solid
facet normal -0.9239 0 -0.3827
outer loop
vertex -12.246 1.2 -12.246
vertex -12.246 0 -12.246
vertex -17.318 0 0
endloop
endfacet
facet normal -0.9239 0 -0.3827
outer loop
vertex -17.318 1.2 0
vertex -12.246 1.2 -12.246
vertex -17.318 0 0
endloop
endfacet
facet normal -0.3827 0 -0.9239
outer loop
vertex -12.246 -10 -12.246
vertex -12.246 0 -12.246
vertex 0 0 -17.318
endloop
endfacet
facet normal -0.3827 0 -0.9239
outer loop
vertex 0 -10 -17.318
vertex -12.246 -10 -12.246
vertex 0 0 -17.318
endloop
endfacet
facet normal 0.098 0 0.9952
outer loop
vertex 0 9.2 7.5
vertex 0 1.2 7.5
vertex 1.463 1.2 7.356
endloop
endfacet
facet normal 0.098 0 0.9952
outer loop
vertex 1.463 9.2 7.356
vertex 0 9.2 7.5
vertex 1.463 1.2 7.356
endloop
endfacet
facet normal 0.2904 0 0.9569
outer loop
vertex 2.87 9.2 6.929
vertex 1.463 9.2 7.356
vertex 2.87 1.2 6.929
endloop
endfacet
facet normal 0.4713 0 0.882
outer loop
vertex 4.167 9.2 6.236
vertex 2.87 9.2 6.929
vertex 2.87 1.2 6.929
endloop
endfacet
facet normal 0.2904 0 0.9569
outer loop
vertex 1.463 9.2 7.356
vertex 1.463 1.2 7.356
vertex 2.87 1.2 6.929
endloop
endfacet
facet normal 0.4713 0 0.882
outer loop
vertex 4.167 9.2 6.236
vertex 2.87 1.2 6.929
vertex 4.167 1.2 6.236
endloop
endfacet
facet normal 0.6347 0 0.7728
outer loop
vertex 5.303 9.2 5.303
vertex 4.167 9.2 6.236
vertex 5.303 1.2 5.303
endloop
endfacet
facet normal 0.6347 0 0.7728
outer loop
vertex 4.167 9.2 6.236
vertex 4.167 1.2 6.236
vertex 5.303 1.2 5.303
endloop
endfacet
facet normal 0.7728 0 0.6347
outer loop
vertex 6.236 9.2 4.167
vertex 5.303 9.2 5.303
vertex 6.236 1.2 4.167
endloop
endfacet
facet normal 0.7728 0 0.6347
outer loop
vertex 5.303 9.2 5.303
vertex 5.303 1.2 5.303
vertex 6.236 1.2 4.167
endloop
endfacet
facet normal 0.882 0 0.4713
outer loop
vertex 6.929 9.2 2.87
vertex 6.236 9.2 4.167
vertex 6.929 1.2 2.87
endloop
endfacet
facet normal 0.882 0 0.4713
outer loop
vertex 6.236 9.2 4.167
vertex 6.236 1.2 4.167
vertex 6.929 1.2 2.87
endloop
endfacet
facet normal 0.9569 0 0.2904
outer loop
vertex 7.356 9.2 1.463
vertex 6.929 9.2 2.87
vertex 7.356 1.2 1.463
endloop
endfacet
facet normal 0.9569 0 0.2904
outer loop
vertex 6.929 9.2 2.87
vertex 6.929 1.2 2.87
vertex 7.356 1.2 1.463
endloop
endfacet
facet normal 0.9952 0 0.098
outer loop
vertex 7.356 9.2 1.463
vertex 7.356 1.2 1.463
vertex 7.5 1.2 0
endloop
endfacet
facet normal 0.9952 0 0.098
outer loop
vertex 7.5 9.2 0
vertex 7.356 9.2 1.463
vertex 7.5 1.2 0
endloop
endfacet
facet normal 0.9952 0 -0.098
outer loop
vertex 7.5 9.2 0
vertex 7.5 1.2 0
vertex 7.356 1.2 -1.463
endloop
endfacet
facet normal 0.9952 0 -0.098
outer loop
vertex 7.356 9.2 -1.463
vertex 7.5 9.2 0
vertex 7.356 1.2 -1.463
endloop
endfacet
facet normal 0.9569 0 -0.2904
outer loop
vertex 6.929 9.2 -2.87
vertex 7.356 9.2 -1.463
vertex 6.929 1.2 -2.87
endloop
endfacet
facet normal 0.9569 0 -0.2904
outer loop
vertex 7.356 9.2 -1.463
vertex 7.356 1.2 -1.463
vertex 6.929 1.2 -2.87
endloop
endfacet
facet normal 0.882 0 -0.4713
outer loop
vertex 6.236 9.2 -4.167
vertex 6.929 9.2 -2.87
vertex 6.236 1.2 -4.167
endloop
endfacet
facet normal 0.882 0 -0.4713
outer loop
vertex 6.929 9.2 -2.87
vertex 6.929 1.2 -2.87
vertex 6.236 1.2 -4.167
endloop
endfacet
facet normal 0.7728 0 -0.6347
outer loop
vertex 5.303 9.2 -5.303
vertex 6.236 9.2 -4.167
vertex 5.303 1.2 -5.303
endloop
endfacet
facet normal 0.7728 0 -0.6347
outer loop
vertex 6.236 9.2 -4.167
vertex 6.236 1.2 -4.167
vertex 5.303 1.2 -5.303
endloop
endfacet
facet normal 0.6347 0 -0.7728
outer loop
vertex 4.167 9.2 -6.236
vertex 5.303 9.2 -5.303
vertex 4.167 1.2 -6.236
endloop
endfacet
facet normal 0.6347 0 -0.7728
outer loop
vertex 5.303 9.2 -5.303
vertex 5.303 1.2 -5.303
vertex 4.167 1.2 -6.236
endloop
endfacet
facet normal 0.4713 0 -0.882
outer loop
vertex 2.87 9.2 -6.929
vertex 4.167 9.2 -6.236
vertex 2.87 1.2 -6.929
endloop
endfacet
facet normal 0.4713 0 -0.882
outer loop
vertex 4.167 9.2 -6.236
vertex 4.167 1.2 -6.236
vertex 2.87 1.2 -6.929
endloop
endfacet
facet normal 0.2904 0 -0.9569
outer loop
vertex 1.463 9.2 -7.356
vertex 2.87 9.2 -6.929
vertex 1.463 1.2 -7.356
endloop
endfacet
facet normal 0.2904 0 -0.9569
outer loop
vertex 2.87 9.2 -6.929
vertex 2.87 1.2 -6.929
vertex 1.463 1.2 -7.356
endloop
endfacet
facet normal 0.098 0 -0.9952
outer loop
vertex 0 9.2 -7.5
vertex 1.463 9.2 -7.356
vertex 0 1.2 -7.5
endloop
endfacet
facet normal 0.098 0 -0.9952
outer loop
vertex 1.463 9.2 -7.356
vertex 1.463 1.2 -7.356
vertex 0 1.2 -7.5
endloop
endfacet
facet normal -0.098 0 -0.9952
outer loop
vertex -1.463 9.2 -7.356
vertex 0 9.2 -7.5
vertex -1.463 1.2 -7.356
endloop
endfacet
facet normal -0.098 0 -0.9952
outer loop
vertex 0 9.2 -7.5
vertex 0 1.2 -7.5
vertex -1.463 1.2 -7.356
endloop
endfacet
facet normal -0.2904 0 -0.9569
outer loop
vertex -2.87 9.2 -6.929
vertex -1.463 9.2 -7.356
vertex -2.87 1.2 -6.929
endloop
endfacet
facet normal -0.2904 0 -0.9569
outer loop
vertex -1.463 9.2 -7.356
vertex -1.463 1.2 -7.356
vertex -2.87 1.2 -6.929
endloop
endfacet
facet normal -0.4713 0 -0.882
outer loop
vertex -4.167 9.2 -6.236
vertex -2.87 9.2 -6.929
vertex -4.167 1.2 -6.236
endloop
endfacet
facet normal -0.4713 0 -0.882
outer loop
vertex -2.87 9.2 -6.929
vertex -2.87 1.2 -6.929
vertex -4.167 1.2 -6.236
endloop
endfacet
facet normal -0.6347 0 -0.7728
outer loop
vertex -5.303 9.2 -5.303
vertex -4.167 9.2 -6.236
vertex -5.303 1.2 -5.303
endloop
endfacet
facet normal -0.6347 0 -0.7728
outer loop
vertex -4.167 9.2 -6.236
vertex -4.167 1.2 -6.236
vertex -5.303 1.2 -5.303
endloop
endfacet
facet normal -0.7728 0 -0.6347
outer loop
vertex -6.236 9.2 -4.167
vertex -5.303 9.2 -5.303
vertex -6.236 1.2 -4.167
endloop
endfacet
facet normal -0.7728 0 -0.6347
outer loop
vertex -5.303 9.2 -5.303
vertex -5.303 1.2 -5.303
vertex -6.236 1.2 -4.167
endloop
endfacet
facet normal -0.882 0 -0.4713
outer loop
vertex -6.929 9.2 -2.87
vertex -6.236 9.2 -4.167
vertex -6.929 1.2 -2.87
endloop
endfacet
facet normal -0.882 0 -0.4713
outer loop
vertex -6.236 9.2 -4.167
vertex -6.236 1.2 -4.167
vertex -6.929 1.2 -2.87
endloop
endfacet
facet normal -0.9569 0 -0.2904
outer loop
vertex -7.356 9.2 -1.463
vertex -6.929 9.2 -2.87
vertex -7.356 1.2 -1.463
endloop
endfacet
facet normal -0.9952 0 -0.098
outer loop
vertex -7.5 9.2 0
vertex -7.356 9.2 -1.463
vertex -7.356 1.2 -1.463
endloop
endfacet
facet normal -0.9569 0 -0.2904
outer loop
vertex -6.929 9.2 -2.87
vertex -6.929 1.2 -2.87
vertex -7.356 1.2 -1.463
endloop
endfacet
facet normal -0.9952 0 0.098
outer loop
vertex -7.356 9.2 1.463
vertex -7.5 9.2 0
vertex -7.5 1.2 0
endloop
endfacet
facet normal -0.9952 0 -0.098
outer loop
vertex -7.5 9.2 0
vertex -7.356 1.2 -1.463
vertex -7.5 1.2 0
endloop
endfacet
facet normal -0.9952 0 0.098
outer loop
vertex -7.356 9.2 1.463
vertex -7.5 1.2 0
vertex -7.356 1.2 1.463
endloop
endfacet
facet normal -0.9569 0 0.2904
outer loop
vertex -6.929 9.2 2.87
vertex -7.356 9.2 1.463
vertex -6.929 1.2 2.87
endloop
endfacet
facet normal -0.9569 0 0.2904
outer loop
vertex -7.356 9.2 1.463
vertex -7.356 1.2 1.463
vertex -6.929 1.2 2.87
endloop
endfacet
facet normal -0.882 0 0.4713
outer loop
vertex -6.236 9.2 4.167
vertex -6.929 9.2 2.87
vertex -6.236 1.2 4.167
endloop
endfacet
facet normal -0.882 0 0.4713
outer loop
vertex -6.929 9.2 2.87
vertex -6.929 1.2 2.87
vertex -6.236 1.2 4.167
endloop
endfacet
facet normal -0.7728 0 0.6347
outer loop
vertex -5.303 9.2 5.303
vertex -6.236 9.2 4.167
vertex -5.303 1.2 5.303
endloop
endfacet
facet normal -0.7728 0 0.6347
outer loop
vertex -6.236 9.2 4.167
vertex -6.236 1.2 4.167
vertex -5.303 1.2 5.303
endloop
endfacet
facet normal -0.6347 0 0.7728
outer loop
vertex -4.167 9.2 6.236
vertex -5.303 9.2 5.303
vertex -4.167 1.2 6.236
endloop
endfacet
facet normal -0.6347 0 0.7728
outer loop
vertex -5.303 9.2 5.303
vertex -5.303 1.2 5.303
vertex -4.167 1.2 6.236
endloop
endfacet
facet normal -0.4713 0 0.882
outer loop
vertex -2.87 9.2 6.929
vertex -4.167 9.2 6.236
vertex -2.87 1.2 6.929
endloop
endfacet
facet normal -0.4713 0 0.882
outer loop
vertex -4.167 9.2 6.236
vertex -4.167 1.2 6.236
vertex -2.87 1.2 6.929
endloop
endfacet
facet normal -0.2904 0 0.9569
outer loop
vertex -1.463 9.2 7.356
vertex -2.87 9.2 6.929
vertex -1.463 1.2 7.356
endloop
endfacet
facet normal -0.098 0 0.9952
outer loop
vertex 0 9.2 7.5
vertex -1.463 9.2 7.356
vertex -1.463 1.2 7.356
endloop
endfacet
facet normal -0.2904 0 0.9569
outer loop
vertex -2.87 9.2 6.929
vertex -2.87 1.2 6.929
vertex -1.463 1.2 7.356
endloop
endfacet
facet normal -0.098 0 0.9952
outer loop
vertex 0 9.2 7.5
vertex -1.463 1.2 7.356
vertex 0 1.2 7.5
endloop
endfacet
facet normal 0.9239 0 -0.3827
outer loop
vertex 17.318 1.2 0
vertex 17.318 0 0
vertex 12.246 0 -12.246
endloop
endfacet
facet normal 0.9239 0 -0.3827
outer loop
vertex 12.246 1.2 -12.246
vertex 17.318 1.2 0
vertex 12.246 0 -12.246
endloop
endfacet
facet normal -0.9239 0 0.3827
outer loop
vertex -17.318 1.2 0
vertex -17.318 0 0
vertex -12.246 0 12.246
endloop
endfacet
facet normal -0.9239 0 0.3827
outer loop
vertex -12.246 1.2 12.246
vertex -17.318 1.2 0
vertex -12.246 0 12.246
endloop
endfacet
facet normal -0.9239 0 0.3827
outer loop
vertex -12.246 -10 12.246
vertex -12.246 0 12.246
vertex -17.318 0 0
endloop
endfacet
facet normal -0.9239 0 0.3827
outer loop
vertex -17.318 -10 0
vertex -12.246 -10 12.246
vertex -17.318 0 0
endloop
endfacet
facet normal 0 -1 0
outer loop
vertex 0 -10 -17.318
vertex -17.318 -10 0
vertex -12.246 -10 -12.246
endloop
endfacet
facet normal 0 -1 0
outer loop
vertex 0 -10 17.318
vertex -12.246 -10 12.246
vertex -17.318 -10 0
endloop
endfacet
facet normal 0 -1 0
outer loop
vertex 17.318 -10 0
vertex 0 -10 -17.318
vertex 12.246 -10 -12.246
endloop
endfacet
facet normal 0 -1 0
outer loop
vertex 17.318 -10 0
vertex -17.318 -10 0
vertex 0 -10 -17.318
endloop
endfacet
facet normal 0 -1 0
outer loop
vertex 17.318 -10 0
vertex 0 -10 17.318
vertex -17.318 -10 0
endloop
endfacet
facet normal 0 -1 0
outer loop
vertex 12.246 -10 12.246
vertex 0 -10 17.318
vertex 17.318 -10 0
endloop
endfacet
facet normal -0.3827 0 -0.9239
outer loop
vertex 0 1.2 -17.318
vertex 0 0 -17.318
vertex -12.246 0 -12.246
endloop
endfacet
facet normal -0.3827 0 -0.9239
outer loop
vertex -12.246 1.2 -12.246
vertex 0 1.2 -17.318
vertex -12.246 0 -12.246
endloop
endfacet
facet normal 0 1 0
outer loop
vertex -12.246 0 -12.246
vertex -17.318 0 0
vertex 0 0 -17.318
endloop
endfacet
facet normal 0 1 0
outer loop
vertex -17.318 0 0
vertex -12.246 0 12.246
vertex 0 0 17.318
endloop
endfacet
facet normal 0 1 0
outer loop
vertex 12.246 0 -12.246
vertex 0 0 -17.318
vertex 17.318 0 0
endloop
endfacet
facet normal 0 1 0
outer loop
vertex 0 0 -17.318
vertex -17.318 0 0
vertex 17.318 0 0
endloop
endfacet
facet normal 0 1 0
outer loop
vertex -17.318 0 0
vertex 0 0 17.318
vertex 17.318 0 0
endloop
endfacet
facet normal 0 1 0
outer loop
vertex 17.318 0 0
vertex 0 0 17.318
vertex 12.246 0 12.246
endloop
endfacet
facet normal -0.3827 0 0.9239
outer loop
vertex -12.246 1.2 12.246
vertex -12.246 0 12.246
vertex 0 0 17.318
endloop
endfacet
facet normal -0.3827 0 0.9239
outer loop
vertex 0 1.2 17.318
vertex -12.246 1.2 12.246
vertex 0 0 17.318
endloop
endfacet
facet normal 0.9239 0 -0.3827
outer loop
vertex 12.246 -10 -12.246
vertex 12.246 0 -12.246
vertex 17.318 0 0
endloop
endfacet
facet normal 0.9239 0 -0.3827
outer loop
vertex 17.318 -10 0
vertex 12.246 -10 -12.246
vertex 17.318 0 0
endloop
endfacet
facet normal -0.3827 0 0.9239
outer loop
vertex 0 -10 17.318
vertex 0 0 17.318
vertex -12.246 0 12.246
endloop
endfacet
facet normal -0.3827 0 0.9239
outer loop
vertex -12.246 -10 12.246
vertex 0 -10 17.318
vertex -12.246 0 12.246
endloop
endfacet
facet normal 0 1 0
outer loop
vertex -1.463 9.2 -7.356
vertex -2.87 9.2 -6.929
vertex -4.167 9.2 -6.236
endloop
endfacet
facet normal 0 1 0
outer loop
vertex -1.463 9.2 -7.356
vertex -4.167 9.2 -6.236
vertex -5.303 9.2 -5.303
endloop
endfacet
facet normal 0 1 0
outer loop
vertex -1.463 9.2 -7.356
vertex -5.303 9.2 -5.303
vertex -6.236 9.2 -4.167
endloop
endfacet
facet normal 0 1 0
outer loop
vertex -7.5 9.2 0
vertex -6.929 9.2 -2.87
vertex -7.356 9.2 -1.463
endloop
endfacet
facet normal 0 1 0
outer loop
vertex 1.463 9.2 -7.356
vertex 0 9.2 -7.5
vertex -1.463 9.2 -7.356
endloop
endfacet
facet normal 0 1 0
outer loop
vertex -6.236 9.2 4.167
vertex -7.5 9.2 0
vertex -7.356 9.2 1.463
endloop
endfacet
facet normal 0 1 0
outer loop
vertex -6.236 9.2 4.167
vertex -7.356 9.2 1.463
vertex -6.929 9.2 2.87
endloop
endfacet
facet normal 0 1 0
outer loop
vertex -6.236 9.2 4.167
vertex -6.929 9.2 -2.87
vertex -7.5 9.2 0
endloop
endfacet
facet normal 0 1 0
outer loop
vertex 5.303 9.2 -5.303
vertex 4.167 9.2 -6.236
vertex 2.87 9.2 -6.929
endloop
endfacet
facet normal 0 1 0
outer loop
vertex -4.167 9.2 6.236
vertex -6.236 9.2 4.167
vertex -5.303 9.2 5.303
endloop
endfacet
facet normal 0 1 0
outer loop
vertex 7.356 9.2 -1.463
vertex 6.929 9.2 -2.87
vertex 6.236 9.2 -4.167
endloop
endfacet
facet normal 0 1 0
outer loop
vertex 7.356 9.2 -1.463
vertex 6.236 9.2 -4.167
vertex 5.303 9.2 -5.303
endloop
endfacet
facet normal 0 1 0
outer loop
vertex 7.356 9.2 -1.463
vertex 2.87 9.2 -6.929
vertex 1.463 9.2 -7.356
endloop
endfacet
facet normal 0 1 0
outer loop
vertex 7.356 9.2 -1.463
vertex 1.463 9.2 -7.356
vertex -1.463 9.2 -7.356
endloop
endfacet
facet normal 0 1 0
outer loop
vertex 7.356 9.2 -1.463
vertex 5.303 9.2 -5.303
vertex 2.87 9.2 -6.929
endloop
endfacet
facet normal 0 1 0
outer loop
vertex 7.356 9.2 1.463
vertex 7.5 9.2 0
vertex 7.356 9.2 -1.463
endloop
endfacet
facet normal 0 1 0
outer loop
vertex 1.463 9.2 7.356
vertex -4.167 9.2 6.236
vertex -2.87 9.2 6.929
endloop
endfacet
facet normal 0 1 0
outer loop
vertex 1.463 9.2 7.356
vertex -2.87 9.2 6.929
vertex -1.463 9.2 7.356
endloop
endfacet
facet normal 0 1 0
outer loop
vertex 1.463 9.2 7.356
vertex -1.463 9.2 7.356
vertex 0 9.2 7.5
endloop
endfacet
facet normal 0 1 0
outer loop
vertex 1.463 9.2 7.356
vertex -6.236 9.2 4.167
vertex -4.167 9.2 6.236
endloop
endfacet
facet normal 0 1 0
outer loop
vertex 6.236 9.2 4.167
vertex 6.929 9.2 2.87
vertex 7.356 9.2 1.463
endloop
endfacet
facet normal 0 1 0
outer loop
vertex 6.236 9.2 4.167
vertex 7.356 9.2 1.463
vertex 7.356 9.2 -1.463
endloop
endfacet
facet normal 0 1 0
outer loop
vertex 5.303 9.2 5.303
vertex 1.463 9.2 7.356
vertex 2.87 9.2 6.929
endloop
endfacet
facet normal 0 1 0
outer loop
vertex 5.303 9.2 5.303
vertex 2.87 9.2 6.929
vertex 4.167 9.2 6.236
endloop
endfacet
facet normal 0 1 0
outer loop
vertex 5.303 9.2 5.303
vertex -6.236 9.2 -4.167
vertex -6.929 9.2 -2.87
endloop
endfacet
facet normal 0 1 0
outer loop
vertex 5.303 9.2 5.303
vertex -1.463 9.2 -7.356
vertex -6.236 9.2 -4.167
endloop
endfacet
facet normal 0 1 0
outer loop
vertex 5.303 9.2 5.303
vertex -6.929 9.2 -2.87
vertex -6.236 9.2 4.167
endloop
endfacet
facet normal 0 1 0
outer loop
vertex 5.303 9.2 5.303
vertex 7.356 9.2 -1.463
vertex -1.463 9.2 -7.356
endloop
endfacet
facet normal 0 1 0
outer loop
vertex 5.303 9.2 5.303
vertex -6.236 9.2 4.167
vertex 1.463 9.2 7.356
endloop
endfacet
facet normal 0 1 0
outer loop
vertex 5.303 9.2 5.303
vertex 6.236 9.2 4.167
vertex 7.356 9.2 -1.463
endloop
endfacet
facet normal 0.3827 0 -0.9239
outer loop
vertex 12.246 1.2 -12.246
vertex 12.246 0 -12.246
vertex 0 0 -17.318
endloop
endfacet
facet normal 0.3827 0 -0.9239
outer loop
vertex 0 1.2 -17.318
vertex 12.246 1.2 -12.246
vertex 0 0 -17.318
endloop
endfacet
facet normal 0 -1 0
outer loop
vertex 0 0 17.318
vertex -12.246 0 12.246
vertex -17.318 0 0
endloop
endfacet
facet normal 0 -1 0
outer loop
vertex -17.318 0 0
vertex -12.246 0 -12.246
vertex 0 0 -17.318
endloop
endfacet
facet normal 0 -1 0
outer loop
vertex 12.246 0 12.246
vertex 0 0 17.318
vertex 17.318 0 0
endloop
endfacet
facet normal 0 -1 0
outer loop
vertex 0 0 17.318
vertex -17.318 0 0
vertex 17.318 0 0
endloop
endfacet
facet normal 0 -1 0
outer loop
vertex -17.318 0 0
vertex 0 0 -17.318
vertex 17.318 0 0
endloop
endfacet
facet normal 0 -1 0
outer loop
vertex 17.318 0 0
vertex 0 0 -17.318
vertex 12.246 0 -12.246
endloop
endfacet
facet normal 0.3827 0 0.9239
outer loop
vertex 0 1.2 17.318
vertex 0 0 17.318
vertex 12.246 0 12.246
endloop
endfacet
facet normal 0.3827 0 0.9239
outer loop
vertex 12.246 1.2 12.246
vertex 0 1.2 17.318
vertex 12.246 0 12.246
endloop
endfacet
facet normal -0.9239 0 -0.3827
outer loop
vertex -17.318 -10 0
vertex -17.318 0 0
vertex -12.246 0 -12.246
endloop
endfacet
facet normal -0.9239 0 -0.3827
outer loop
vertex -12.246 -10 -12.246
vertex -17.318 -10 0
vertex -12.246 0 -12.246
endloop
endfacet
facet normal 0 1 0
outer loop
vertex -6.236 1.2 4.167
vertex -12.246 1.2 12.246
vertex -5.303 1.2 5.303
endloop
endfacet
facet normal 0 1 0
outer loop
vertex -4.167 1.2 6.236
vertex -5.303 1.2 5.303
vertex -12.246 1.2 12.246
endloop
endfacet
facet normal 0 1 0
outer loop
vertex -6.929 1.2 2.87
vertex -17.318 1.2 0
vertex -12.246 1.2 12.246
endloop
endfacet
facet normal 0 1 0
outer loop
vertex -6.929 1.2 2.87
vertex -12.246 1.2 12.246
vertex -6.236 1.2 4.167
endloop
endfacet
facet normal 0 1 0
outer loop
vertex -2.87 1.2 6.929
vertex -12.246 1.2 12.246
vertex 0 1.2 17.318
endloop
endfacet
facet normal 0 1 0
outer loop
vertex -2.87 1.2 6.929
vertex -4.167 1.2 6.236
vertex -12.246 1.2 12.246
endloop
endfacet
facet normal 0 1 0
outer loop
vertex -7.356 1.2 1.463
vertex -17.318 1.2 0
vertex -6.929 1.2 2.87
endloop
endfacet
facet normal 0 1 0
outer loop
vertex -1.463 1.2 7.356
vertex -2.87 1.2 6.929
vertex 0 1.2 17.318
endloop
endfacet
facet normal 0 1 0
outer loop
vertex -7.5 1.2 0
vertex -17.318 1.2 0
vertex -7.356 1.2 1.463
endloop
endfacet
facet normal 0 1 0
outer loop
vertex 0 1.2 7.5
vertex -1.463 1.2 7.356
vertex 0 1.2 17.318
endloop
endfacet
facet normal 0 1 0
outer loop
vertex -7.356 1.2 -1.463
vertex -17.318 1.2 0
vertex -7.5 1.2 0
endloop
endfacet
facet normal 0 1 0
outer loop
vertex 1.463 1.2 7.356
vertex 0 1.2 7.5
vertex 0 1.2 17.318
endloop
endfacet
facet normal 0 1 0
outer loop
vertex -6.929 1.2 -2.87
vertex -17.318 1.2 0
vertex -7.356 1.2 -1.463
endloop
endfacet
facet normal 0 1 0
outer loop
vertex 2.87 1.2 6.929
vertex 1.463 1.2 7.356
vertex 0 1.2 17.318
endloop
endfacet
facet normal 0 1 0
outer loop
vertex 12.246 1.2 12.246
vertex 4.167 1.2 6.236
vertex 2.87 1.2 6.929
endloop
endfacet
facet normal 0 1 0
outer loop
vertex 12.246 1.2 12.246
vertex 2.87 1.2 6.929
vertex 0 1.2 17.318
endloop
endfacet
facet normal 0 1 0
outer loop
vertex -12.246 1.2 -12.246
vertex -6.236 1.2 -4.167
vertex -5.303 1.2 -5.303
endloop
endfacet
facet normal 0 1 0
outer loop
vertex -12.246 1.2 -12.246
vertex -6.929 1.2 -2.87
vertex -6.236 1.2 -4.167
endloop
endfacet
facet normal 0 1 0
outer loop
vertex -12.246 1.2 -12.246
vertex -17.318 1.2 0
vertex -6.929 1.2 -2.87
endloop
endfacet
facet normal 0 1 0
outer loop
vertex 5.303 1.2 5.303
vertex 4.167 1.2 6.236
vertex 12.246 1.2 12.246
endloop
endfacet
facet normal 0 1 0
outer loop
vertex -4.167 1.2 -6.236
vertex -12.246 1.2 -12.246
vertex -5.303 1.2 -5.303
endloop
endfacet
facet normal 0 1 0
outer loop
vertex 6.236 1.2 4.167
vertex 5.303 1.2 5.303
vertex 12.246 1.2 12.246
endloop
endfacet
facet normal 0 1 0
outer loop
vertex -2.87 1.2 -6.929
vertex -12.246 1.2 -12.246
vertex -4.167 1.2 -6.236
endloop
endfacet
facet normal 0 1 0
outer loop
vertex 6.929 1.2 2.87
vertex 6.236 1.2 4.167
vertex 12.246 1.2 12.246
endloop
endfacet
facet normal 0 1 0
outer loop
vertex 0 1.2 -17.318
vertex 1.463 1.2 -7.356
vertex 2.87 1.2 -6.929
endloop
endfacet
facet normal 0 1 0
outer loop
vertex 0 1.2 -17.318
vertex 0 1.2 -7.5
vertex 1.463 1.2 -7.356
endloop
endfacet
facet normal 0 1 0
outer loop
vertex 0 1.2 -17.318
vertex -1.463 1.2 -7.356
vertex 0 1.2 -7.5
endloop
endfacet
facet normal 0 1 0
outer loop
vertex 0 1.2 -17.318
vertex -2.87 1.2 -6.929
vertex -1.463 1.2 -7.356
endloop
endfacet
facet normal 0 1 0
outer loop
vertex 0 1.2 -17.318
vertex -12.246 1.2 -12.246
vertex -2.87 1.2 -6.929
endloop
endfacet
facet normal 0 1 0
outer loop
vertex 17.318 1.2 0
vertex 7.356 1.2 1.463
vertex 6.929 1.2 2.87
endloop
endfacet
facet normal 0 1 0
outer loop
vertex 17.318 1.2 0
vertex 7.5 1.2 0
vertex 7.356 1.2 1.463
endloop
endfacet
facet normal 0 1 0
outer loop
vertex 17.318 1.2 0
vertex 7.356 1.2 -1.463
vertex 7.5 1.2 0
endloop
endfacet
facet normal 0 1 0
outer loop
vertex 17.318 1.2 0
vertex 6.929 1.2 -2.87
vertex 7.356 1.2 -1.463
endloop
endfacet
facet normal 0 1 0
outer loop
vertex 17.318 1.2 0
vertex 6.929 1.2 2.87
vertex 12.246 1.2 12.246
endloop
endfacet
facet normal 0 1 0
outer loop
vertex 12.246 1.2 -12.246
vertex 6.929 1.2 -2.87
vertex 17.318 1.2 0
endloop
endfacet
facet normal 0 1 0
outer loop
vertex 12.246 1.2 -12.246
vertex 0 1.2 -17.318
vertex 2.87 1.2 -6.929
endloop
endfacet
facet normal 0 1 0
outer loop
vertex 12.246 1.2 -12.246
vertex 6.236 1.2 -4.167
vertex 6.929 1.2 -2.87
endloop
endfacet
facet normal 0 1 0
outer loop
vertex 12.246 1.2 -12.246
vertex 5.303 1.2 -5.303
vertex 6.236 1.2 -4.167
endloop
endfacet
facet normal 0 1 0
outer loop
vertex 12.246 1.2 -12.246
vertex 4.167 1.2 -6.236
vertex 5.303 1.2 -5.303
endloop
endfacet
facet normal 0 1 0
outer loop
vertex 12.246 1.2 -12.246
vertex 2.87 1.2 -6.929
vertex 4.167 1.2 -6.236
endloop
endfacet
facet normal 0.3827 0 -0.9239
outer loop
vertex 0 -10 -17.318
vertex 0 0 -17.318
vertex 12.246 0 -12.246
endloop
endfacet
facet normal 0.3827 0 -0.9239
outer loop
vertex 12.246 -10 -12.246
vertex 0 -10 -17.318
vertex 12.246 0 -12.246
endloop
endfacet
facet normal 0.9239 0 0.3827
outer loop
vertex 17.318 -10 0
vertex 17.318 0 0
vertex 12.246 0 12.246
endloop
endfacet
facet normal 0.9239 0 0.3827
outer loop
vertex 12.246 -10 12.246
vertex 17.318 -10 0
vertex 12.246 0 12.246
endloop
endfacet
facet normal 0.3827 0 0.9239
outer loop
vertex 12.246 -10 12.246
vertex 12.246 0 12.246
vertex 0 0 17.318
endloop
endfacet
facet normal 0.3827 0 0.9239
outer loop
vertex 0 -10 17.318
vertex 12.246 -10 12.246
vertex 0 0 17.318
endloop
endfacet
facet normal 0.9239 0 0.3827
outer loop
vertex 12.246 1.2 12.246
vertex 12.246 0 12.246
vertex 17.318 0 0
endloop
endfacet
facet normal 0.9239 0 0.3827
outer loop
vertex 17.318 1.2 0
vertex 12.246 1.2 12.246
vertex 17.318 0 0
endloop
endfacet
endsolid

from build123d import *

# Parameters (mm, degrees)
BOSS_EXTRUDE1_DEPTH = 1.2
SKETCH2_R           = 7.5
BOSS_EXTRUDE2_DEPTH = 8
BOSS_EXTRUDE3_DEPTH = 10


with BuildPart() as part:
    # Sketch1 → Boss-Extrude1 (new body)
    with BuildSketch(Plane(origin=(0, 0, 0), x_dir=(1, 0, 0), z_dir=(0, 1, 0))):
        Polygon((0, -17.318275205), (12.245869836, -12.245869836), (17.318275205, 0), (12.245869836, 12.245869836), (0, 17.318275205), (-12.245869836, 12.245869836), (-17.318275205, 0), (-12.245869836, -12.245869836), align=None)
    extrude(amount=BOSS_EXTRUDE1_DEPTH)

    # Sketch2 → Boss-Extrude2 (add)
    with BuildSketch(Plane(origin=(0, 1.2, 0), x_dir=(1, 0, 0), z_dir=(0, 1, 0))):
        with Locations(Location((0, 0, 0), (0, 0, 270))):
            Circle(SKETCH2_R)
    extrude(amount=BOSS_EXTRUDE2_DEPTH)


with BuildPart() as body_2:
    # Sketch3 → Boss-Extrude3 (new body)
    with BuildSketch(Plane.XZ):
        Polygon((12.245869836, 12.245869836), (0, 17.318275205), (-12.245869836, 12.245869836), (-17.318275205, 0), (-12.245869836, -12.245869836), (0, -17.318275205), (12.245869836, -12.245869836), (17.318275205, 0), align=None)
    extrude(amount=BOSS_EXTRUDE3_DEPTH)


solid = Compound([part.part, body_2.part])
